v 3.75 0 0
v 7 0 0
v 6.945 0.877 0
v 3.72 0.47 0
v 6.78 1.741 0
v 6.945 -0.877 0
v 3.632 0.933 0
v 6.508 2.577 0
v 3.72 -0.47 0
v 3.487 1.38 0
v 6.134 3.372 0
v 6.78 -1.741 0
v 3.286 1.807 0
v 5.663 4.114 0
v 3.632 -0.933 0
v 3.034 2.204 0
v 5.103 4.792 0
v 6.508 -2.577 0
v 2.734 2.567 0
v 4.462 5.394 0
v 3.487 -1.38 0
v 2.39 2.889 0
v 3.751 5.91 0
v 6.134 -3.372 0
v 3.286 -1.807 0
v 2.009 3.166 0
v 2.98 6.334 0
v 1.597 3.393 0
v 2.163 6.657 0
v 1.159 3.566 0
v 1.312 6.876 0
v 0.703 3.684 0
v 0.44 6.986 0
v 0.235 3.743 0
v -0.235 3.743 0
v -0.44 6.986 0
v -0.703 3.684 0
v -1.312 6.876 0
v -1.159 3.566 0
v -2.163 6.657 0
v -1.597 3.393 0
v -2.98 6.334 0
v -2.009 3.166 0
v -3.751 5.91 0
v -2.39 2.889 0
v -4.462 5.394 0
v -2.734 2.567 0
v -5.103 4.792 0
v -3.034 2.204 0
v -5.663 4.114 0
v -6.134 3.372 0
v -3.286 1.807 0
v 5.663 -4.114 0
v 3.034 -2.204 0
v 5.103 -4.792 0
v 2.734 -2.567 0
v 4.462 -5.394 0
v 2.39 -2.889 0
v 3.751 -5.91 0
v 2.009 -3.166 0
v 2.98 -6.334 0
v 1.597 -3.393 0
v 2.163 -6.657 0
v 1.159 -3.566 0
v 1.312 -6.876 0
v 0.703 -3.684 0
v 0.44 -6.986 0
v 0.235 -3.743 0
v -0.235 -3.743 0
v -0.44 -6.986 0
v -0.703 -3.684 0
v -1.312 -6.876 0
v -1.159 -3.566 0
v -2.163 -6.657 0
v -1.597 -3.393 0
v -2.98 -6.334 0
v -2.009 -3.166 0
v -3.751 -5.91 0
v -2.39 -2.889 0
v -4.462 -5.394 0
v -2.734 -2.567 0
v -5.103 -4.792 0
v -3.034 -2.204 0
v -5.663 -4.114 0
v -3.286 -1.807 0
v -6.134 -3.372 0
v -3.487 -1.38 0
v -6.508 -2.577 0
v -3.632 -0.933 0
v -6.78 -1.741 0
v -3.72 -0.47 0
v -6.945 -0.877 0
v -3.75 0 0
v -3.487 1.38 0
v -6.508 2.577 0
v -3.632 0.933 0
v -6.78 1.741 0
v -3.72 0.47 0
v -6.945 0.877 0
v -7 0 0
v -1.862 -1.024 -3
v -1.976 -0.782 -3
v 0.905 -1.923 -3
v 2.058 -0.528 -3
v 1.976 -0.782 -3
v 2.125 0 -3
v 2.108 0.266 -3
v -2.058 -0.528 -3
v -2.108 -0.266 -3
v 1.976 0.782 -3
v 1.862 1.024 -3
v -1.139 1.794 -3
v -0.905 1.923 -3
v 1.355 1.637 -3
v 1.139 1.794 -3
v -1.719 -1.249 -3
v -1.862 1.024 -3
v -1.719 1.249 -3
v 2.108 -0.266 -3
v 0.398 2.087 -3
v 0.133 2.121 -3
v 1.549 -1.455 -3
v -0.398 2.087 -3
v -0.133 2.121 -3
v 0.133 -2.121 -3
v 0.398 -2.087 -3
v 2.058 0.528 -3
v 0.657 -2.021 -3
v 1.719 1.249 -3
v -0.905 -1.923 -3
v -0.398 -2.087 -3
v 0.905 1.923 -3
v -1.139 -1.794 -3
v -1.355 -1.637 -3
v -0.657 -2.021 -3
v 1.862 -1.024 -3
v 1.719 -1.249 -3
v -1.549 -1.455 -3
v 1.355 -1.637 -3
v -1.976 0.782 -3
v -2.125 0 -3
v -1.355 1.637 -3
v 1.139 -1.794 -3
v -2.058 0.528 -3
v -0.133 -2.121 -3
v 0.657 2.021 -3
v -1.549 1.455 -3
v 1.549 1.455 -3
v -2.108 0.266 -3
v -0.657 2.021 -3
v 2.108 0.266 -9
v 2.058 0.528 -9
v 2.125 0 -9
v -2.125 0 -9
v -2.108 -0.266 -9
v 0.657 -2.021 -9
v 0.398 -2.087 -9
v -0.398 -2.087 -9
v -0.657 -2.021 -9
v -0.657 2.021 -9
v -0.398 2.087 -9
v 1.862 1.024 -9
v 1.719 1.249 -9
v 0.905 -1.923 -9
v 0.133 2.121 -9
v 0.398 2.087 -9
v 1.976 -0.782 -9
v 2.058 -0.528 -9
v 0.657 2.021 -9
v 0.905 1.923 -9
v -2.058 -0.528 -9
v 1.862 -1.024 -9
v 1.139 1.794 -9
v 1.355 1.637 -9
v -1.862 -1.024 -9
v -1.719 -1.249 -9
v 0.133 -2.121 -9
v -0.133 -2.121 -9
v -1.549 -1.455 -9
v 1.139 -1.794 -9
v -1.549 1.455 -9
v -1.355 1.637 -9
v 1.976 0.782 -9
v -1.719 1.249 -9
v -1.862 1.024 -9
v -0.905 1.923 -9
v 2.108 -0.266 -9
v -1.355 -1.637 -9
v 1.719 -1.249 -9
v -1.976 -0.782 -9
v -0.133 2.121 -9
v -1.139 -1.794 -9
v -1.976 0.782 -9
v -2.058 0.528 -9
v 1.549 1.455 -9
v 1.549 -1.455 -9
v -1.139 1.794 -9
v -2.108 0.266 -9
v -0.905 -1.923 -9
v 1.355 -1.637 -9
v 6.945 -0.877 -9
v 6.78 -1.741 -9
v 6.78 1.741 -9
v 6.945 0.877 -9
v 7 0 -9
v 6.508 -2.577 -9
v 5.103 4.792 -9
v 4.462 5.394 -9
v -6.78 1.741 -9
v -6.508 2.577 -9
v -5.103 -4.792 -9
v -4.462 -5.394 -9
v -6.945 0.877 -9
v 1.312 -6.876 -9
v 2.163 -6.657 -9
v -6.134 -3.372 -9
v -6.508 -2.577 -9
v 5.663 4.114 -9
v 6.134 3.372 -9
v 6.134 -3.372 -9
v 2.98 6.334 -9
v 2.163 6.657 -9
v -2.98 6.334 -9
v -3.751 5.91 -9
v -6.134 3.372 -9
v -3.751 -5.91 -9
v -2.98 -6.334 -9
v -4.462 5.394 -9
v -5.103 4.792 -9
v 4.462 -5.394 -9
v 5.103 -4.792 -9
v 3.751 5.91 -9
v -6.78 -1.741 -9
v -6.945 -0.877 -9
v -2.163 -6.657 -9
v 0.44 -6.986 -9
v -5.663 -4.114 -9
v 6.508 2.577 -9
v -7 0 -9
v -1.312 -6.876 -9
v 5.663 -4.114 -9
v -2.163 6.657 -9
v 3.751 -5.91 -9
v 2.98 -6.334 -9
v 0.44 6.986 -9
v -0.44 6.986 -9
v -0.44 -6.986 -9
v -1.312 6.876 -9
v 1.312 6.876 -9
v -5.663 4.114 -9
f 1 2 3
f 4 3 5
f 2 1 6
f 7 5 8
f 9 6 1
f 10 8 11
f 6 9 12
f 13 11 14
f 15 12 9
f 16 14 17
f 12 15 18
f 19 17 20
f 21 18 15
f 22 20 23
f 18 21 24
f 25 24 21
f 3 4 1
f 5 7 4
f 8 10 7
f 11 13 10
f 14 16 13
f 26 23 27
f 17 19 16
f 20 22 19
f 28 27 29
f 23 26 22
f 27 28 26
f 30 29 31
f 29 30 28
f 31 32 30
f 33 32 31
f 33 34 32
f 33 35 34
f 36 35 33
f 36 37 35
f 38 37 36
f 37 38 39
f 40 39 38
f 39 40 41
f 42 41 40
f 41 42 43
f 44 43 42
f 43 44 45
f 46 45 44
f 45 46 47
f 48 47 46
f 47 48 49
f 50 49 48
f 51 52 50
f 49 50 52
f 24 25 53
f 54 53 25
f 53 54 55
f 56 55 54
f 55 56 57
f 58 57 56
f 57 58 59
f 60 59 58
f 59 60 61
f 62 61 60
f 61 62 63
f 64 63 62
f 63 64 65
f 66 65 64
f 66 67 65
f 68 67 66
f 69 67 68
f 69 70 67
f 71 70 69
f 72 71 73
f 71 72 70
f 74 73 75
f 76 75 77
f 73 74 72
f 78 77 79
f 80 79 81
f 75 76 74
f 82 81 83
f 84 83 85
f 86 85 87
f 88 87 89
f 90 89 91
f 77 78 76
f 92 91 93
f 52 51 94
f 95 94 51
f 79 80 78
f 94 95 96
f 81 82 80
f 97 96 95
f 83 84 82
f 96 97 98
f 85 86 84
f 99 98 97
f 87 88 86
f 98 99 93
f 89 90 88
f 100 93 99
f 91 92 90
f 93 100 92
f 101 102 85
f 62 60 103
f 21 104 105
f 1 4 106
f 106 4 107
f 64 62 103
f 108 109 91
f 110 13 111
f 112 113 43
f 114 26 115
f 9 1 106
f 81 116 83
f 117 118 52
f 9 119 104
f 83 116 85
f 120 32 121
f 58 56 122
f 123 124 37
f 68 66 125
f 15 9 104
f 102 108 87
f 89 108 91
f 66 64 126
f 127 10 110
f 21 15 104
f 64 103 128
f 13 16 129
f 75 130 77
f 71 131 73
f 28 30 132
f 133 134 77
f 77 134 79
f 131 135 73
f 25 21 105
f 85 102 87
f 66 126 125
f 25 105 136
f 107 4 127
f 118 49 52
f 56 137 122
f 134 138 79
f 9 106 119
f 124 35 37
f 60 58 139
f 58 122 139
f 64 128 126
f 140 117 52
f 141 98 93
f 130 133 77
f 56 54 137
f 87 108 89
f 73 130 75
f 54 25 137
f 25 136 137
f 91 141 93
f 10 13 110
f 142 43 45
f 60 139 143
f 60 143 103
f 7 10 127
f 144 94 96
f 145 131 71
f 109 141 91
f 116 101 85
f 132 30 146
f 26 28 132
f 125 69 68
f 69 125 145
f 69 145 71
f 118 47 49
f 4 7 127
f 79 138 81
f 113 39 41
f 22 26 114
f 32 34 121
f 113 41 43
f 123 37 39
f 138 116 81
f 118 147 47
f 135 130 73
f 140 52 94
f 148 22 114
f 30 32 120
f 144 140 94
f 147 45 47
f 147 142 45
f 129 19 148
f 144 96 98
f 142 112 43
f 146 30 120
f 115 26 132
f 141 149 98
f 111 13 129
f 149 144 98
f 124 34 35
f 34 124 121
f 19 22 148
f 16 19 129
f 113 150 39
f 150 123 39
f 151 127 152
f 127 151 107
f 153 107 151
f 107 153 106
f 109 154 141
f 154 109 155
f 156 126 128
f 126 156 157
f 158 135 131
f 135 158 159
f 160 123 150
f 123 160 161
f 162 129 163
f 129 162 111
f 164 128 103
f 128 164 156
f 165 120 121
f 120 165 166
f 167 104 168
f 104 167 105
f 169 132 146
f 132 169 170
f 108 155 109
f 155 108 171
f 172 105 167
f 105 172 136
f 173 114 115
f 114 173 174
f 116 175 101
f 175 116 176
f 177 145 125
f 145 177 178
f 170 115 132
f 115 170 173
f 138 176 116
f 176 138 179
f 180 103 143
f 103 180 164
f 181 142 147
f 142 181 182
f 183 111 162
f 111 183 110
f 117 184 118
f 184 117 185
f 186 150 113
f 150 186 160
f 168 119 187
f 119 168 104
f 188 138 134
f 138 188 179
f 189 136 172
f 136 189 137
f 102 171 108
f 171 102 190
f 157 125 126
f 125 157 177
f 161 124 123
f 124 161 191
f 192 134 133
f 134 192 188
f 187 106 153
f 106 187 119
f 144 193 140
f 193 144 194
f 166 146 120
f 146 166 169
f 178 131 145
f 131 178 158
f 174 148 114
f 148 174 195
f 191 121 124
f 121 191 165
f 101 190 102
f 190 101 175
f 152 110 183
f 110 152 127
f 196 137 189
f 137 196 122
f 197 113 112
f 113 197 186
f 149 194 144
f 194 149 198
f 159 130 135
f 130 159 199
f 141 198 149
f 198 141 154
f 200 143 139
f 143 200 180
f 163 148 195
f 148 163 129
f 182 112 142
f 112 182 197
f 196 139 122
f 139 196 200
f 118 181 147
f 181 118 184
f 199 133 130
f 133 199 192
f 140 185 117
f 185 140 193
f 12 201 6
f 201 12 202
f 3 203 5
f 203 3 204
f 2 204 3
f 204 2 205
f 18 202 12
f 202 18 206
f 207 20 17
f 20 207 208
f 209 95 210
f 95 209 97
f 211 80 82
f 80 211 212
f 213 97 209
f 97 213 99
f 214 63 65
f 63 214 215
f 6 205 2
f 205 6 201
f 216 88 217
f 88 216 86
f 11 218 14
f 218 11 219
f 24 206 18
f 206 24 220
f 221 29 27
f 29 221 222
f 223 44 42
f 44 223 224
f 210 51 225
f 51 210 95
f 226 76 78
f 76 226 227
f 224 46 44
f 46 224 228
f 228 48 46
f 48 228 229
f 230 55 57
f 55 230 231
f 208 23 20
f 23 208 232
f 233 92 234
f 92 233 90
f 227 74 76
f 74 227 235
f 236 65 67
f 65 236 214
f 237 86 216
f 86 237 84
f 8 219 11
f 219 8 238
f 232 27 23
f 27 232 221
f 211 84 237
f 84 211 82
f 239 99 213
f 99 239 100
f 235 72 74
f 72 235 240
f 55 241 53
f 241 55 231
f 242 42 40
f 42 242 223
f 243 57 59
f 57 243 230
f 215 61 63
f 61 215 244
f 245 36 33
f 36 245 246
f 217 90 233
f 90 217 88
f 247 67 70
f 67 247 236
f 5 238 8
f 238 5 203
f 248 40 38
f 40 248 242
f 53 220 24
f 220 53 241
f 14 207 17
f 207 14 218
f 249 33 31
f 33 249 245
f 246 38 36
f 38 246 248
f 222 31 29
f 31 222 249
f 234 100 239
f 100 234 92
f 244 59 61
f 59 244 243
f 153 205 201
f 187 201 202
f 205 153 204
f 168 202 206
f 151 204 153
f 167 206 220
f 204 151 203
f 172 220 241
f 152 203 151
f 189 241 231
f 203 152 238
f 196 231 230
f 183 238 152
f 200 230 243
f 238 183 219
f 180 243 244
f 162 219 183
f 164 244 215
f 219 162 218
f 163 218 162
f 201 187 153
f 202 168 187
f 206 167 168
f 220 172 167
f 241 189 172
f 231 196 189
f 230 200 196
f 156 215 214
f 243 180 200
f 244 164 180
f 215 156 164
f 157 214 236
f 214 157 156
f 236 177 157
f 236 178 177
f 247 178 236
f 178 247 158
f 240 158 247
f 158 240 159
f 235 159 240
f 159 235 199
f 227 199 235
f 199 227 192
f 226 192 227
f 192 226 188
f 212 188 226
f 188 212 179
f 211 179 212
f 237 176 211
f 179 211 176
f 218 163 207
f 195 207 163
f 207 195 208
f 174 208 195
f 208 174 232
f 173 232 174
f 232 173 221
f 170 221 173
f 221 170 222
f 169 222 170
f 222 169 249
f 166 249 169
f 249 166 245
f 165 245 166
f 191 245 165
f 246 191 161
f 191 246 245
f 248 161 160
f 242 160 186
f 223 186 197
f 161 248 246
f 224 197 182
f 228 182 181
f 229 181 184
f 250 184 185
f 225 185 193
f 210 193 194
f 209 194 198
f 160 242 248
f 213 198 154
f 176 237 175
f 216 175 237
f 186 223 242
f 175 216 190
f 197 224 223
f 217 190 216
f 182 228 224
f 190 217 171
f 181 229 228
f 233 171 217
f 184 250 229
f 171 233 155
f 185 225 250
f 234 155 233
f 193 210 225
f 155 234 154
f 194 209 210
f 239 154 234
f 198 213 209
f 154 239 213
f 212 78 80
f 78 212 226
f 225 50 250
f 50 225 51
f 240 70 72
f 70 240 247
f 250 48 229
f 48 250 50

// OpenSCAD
$fn = 50;

difference() {
	union() {
		translate(v = [0, 0, -9.0]) {
			cylinder(h = 9, r = 7.0);
		}
	}
	union() {
		translate(v = [0, 0, 0]) {
			rotate(a = [0, 0, 0]) {
				difference() {
					union() {
						translate(v = [0, 0, -12.0]) {
							cylinder(h = 12, r = 2.0);
						}
						translate(v = [0, 0, -3]) {
							cylinder(h = 3, r1 = 2.125, r2 = 3.75);
						}
						translate(v = [0, 0, -12.0]) {
							cylinder(h = 12, r = 2.125);
						}
						translate(v = [0, 0, -12.0]) {
							cylinder(h = 12, r = 2.0);
						}
					}
					union();
				}
			}
		}
	}
}
